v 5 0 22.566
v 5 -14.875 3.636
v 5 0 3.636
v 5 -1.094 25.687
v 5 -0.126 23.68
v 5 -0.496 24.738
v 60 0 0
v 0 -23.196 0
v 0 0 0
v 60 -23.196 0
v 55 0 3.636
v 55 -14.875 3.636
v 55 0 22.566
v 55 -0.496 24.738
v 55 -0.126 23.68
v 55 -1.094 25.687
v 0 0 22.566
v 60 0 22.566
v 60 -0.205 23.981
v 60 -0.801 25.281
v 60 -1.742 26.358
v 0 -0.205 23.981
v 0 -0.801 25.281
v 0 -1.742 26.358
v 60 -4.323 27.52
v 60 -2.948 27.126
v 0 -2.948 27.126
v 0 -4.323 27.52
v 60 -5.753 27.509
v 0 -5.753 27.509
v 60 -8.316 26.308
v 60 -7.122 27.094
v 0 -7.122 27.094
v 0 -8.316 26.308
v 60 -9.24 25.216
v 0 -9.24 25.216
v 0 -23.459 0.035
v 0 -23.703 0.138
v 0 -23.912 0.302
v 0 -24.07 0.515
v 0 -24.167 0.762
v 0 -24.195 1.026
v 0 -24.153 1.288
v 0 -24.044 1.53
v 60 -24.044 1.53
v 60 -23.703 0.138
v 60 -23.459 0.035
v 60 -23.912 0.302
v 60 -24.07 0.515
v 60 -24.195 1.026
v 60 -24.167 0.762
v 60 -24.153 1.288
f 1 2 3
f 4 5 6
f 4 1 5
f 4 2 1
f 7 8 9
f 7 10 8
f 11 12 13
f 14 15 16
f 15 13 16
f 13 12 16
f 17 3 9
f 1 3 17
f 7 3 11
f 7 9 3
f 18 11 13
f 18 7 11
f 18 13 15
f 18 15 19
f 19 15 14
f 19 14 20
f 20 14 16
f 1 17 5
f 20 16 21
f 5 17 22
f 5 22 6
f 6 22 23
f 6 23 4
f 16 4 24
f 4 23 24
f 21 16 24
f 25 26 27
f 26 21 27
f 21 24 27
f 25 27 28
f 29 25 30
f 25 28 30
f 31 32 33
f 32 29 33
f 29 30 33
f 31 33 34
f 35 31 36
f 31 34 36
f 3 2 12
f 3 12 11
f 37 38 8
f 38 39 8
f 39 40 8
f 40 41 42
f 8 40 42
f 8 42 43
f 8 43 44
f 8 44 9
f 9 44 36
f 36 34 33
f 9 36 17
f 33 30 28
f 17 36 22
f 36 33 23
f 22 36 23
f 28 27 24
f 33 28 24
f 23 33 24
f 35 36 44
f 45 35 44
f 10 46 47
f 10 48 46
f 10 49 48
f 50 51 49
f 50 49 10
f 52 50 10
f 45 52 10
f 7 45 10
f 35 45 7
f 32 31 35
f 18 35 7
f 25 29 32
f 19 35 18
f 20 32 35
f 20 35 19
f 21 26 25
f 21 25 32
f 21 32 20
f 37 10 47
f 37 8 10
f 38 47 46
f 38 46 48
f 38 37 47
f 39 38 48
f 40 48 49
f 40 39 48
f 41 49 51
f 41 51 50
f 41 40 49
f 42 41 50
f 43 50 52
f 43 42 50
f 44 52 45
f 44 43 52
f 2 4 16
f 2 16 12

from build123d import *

# Parameters (mm, degrees)
F1_DEPTH    = 30
F3_DEPTH    = 25
F5_T1_DEPTH = 147.1699056603
F6_R        = 1


# Not quite as in the source:
# - a fillet or chamfer that OpenCascade refuses, or shapes differently, is made with other operations: its cross-section is extruded or revolved along the edge and cut away or added


with BuildPart() as f1:
    # F0 (on Right) → F1 (new body)
    with BuildSketch(Plane.YZ):
        Polygon((-25, 0), (0, 0), (0, 40), align=None)
    extrude(amount=F1_DEPTH)

    # F2 (on face) → F3 (cut)
    with BuildSketch(Plane.YZ.offset(30)):
        Polygon((-14.8754669353, 3.6356896162), (0, 3.6356896162), (0, 27.4364367127), align=None)
    extrude(amount=-F3_DEPTH, mode=Mode.SUBTRACT)

    # F4: F1 across face


with BuildPart() as f1_1:
    add(f1.part)
    add(f1.part.mirror(Plane(origin=(30, -10.1830881956, 14.3002167565), x_dir=(0, 1, 0), z_dir=(1, 0, 0))))

    # F5: fillet of radius 5 on 1 edges, made by hand

    # F5_s2 → F5_t1 (cut)
    with BuildSketch(Plane.YZ.offset(-43.5849528301)):
        with BuildLine():
            ThreePointArc((0, 22.5660188679), (-3.6215874348, 27.3722625988), (-9.23999152, 25.216013568))
            Line((-9.23999152, 25.216013568), (0, 40))
            Line((0, 40), (0, 22.5660188679))
        make_face()
    extrude(amount=F5_T1_DEPTH, mode=Mode.SUBTRACT)

    # F6
    f6_edges = [f1_1.edges().sort_by_distance(p)[0] for p in [
        (30, -25, 0),
    ]]
    fillet(f6_edges, radius=F6_R)


solid = f1_1.part
